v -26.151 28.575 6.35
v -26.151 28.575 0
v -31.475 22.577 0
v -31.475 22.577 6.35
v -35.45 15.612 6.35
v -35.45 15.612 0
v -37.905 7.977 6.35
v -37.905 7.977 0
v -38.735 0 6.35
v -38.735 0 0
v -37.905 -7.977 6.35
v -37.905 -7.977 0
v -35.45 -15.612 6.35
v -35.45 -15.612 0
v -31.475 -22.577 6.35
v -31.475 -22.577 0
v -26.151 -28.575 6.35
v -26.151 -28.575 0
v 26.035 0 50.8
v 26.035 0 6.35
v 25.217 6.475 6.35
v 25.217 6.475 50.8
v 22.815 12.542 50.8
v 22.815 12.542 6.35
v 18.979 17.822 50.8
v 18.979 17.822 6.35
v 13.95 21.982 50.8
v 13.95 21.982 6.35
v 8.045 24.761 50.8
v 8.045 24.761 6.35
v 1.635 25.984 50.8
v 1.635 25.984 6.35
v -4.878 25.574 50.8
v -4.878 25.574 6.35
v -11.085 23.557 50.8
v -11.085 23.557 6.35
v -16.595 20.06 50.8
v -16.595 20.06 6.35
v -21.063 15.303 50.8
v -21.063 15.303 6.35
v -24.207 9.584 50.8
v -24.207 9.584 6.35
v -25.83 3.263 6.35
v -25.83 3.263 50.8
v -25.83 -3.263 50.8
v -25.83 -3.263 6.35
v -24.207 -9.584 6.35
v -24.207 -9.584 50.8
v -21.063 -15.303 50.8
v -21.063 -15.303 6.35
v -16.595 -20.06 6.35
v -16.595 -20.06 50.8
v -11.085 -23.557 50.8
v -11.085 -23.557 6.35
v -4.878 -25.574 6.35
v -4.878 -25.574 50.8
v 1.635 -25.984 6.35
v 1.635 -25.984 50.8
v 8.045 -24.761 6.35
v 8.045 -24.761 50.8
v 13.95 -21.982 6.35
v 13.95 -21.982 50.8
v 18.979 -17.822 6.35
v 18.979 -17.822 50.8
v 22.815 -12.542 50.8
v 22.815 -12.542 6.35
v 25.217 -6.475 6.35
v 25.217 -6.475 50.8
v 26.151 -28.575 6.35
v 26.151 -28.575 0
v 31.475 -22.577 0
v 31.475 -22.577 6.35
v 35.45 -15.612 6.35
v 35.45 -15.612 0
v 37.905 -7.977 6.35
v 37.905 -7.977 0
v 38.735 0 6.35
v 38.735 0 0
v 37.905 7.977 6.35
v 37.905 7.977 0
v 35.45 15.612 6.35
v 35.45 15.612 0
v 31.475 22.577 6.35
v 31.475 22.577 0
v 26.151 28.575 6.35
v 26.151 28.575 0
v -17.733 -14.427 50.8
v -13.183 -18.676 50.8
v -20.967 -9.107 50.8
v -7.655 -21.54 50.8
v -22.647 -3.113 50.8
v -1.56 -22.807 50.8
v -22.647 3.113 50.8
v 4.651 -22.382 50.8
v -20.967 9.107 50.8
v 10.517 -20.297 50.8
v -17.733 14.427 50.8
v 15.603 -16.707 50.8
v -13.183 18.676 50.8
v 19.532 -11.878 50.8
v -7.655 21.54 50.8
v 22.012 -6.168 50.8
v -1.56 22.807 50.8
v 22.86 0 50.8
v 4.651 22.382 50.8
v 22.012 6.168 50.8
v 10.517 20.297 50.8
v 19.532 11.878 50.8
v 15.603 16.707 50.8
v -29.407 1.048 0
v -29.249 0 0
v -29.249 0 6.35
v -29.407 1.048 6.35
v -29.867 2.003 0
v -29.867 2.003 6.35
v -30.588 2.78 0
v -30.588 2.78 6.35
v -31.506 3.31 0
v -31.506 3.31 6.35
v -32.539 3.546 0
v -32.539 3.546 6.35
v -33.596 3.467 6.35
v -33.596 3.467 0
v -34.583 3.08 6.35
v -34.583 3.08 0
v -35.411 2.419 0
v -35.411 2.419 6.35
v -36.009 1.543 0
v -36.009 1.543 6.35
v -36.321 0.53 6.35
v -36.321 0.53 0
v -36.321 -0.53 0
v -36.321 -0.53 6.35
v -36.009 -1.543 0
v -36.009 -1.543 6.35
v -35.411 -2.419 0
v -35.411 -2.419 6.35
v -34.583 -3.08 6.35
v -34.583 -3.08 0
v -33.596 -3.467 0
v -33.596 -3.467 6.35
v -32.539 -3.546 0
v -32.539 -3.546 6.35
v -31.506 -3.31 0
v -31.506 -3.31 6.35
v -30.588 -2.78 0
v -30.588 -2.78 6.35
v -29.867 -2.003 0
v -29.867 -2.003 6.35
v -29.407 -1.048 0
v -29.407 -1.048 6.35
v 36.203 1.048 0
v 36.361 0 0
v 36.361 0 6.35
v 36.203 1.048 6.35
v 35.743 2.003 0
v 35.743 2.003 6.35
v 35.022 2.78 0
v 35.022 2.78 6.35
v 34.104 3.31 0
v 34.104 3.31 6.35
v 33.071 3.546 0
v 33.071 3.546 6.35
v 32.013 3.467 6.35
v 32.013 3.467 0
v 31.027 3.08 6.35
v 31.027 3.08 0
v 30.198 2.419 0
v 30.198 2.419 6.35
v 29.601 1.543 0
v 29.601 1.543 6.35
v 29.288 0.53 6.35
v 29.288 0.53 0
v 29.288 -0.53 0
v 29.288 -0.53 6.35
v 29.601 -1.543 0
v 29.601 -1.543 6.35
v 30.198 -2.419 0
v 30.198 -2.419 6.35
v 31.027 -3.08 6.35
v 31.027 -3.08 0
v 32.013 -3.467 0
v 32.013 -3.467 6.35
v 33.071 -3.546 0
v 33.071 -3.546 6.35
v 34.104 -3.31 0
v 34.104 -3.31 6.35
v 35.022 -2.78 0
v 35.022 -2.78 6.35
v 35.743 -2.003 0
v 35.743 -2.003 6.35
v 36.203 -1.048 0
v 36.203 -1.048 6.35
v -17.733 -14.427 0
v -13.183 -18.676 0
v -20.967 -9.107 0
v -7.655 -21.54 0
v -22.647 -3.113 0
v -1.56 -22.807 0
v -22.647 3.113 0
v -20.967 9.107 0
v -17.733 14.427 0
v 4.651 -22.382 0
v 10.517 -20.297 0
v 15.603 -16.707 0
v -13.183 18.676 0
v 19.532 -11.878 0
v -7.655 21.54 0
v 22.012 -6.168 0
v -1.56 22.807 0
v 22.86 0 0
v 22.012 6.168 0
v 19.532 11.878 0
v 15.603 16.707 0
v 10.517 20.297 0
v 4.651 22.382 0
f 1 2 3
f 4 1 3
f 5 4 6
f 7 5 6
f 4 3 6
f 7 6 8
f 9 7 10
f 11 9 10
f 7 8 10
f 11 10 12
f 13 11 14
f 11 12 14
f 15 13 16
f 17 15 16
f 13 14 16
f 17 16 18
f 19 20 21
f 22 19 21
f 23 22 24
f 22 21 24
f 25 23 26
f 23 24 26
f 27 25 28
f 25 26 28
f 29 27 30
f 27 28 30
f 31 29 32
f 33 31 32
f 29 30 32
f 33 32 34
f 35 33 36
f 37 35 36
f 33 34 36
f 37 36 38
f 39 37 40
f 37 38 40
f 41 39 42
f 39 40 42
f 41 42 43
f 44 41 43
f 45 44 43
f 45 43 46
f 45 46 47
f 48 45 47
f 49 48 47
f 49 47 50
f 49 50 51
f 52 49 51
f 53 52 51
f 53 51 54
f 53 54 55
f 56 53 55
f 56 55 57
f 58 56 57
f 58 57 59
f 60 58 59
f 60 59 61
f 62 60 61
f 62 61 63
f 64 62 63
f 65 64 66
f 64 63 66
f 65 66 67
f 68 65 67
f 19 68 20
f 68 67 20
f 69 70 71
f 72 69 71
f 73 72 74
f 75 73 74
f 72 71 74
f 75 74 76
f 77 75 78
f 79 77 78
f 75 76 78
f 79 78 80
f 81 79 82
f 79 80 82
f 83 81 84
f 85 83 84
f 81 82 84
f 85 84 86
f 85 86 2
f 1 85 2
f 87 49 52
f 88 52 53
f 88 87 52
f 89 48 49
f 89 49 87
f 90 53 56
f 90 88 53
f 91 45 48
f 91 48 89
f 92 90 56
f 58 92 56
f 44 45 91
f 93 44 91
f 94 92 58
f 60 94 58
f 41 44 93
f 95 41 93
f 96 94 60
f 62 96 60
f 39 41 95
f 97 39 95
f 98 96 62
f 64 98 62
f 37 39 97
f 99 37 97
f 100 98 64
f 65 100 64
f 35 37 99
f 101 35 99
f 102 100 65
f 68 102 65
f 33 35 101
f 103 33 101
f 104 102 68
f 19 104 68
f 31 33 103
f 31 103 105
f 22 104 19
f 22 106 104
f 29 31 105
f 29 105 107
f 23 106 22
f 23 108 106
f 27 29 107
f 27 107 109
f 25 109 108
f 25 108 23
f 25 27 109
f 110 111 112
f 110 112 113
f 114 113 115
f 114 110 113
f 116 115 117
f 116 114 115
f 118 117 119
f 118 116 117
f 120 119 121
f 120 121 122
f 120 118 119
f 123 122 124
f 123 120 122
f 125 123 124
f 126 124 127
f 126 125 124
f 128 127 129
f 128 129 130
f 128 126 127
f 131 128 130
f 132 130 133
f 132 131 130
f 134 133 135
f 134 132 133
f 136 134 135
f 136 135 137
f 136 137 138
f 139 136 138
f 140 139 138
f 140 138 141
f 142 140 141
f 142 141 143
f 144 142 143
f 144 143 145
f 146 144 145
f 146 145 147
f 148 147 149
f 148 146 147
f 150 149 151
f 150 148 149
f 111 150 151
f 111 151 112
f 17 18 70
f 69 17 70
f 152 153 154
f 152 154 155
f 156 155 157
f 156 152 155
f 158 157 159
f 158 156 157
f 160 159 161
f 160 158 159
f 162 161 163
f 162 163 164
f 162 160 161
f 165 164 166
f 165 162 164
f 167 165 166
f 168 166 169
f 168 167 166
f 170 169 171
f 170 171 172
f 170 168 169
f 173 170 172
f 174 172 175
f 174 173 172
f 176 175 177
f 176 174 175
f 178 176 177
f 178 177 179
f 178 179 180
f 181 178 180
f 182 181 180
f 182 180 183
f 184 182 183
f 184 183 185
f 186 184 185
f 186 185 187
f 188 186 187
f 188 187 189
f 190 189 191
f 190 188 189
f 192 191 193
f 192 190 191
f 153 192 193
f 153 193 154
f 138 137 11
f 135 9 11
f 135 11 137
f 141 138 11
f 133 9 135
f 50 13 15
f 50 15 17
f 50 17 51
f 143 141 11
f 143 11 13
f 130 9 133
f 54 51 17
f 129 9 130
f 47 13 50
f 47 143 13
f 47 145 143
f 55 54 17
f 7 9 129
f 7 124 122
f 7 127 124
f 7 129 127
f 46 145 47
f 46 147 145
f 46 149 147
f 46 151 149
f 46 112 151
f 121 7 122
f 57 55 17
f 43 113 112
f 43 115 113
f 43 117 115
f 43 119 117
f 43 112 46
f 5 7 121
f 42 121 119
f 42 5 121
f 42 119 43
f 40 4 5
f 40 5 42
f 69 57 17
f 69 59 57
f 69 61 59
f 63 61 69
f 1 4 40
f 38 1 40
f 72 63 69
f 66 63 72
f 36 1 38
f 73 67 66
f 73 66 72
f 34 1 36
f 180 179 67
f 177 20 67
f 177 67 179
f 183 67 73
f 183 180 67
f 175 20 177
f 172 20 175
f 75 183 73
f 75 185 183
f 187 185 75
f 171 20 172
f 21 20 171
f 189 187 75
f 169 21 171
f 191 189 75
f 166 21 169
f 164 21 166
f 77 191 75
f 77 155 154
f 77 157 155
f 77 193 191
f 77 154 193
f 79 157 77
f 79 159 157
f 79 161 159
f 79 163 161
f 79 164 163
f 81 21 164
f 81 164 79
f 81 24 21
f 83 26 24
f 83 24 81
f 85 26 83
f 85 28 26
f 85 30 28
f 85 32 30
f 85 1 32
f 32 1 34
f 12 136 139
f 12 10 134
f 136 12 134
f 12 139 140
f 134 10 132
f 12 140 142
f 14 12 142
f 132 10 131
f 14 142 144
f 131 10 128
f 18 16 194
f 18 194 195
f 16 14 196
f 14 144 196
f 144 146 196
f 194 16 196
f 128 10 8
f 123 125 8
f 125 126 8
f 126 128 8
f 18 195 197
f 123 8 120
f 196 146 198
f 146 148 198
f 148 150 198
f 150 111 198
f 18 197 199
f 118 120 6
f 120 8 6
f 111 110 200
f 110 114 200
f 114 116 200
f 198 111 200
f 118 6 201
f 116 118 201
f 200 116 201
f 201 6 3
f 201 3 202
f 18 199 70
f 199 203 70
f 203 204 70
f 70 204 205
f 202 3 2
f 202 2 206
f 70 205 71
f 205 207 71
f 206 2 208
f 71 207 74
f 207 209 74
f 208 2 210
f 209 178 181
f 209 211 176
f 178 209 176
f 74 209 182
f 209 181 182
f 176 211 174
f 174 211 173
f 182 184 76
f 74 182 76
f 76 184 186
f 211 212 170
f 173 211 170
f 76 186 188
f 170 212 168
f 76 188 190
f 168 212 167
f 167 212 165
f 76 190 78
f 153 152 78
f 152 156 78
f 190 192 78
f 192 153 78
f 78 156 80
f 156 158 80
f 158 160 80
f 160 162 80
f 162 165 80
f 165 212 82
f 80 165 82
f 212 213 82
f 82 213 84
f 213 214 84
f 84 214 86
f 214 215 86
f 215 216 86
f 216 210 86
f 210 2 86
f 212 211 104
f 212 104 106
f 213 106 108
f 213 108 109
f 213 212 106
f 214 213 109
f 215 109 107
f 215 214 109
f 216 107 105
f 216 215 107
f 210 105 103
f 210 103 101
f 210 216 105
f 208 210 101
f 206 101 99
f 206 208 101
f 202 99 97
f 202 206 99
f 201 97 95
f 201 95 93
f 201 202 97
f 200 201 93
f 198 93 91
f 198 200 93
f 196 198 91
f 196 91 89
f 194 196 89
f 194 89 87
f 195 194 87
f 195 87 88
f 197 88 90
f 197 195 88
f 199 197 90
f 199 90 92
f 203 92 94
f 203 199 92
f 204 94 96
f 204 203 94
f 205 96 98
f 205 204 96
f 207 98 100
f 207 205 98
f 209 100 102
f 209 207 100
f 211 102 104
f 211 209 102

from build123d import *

# Parameters (mm, degrees)
F0_R     = 26.035
F0_R_2   = 22.86
F1_DEPTH = 50.8
F0_R_3   = 3.556
F2_DEPTH = 6.35


with BuildPart() as f1:
    # F0 (on Top) → F1 (new body)
    with BuildSketch(Plane.XY):
        Circle(F0_R)
        Circle(F0_R_2, mode=Mode.SUBTRACT)
    extrude(amount=F1_DEPTH)

    # F0 (on Top) → F2 (join)
    with BuildSketch(Plane.XY):
        with BuildLine():
            Line((26.150901, 28.575), (-26.150901, 28.575))
            ThreePointArc((-26.150901, 28.575), (-38.735, 0), (-26.150901, -28.575))
            Line((-26.150901, -28.575), (26.150901, -28.575))
            ThreePointArc((26.150901, -28.575), (38.735, 0), (26.150901, 28.575))
        make_face()
        with Locations((-32.804761, 0)):
            Circle(F0_R_3, mode=Mode.SUBTRACT)
        Circle(F0_R, mode=Mode.SUBTRACT)
        with Locations((32.804761, 0)):
            Circle(F0_R_3, mode=Mode.SUBTRACT)
    extrude(amount=F2_DEPTH)


solid = f1.part
